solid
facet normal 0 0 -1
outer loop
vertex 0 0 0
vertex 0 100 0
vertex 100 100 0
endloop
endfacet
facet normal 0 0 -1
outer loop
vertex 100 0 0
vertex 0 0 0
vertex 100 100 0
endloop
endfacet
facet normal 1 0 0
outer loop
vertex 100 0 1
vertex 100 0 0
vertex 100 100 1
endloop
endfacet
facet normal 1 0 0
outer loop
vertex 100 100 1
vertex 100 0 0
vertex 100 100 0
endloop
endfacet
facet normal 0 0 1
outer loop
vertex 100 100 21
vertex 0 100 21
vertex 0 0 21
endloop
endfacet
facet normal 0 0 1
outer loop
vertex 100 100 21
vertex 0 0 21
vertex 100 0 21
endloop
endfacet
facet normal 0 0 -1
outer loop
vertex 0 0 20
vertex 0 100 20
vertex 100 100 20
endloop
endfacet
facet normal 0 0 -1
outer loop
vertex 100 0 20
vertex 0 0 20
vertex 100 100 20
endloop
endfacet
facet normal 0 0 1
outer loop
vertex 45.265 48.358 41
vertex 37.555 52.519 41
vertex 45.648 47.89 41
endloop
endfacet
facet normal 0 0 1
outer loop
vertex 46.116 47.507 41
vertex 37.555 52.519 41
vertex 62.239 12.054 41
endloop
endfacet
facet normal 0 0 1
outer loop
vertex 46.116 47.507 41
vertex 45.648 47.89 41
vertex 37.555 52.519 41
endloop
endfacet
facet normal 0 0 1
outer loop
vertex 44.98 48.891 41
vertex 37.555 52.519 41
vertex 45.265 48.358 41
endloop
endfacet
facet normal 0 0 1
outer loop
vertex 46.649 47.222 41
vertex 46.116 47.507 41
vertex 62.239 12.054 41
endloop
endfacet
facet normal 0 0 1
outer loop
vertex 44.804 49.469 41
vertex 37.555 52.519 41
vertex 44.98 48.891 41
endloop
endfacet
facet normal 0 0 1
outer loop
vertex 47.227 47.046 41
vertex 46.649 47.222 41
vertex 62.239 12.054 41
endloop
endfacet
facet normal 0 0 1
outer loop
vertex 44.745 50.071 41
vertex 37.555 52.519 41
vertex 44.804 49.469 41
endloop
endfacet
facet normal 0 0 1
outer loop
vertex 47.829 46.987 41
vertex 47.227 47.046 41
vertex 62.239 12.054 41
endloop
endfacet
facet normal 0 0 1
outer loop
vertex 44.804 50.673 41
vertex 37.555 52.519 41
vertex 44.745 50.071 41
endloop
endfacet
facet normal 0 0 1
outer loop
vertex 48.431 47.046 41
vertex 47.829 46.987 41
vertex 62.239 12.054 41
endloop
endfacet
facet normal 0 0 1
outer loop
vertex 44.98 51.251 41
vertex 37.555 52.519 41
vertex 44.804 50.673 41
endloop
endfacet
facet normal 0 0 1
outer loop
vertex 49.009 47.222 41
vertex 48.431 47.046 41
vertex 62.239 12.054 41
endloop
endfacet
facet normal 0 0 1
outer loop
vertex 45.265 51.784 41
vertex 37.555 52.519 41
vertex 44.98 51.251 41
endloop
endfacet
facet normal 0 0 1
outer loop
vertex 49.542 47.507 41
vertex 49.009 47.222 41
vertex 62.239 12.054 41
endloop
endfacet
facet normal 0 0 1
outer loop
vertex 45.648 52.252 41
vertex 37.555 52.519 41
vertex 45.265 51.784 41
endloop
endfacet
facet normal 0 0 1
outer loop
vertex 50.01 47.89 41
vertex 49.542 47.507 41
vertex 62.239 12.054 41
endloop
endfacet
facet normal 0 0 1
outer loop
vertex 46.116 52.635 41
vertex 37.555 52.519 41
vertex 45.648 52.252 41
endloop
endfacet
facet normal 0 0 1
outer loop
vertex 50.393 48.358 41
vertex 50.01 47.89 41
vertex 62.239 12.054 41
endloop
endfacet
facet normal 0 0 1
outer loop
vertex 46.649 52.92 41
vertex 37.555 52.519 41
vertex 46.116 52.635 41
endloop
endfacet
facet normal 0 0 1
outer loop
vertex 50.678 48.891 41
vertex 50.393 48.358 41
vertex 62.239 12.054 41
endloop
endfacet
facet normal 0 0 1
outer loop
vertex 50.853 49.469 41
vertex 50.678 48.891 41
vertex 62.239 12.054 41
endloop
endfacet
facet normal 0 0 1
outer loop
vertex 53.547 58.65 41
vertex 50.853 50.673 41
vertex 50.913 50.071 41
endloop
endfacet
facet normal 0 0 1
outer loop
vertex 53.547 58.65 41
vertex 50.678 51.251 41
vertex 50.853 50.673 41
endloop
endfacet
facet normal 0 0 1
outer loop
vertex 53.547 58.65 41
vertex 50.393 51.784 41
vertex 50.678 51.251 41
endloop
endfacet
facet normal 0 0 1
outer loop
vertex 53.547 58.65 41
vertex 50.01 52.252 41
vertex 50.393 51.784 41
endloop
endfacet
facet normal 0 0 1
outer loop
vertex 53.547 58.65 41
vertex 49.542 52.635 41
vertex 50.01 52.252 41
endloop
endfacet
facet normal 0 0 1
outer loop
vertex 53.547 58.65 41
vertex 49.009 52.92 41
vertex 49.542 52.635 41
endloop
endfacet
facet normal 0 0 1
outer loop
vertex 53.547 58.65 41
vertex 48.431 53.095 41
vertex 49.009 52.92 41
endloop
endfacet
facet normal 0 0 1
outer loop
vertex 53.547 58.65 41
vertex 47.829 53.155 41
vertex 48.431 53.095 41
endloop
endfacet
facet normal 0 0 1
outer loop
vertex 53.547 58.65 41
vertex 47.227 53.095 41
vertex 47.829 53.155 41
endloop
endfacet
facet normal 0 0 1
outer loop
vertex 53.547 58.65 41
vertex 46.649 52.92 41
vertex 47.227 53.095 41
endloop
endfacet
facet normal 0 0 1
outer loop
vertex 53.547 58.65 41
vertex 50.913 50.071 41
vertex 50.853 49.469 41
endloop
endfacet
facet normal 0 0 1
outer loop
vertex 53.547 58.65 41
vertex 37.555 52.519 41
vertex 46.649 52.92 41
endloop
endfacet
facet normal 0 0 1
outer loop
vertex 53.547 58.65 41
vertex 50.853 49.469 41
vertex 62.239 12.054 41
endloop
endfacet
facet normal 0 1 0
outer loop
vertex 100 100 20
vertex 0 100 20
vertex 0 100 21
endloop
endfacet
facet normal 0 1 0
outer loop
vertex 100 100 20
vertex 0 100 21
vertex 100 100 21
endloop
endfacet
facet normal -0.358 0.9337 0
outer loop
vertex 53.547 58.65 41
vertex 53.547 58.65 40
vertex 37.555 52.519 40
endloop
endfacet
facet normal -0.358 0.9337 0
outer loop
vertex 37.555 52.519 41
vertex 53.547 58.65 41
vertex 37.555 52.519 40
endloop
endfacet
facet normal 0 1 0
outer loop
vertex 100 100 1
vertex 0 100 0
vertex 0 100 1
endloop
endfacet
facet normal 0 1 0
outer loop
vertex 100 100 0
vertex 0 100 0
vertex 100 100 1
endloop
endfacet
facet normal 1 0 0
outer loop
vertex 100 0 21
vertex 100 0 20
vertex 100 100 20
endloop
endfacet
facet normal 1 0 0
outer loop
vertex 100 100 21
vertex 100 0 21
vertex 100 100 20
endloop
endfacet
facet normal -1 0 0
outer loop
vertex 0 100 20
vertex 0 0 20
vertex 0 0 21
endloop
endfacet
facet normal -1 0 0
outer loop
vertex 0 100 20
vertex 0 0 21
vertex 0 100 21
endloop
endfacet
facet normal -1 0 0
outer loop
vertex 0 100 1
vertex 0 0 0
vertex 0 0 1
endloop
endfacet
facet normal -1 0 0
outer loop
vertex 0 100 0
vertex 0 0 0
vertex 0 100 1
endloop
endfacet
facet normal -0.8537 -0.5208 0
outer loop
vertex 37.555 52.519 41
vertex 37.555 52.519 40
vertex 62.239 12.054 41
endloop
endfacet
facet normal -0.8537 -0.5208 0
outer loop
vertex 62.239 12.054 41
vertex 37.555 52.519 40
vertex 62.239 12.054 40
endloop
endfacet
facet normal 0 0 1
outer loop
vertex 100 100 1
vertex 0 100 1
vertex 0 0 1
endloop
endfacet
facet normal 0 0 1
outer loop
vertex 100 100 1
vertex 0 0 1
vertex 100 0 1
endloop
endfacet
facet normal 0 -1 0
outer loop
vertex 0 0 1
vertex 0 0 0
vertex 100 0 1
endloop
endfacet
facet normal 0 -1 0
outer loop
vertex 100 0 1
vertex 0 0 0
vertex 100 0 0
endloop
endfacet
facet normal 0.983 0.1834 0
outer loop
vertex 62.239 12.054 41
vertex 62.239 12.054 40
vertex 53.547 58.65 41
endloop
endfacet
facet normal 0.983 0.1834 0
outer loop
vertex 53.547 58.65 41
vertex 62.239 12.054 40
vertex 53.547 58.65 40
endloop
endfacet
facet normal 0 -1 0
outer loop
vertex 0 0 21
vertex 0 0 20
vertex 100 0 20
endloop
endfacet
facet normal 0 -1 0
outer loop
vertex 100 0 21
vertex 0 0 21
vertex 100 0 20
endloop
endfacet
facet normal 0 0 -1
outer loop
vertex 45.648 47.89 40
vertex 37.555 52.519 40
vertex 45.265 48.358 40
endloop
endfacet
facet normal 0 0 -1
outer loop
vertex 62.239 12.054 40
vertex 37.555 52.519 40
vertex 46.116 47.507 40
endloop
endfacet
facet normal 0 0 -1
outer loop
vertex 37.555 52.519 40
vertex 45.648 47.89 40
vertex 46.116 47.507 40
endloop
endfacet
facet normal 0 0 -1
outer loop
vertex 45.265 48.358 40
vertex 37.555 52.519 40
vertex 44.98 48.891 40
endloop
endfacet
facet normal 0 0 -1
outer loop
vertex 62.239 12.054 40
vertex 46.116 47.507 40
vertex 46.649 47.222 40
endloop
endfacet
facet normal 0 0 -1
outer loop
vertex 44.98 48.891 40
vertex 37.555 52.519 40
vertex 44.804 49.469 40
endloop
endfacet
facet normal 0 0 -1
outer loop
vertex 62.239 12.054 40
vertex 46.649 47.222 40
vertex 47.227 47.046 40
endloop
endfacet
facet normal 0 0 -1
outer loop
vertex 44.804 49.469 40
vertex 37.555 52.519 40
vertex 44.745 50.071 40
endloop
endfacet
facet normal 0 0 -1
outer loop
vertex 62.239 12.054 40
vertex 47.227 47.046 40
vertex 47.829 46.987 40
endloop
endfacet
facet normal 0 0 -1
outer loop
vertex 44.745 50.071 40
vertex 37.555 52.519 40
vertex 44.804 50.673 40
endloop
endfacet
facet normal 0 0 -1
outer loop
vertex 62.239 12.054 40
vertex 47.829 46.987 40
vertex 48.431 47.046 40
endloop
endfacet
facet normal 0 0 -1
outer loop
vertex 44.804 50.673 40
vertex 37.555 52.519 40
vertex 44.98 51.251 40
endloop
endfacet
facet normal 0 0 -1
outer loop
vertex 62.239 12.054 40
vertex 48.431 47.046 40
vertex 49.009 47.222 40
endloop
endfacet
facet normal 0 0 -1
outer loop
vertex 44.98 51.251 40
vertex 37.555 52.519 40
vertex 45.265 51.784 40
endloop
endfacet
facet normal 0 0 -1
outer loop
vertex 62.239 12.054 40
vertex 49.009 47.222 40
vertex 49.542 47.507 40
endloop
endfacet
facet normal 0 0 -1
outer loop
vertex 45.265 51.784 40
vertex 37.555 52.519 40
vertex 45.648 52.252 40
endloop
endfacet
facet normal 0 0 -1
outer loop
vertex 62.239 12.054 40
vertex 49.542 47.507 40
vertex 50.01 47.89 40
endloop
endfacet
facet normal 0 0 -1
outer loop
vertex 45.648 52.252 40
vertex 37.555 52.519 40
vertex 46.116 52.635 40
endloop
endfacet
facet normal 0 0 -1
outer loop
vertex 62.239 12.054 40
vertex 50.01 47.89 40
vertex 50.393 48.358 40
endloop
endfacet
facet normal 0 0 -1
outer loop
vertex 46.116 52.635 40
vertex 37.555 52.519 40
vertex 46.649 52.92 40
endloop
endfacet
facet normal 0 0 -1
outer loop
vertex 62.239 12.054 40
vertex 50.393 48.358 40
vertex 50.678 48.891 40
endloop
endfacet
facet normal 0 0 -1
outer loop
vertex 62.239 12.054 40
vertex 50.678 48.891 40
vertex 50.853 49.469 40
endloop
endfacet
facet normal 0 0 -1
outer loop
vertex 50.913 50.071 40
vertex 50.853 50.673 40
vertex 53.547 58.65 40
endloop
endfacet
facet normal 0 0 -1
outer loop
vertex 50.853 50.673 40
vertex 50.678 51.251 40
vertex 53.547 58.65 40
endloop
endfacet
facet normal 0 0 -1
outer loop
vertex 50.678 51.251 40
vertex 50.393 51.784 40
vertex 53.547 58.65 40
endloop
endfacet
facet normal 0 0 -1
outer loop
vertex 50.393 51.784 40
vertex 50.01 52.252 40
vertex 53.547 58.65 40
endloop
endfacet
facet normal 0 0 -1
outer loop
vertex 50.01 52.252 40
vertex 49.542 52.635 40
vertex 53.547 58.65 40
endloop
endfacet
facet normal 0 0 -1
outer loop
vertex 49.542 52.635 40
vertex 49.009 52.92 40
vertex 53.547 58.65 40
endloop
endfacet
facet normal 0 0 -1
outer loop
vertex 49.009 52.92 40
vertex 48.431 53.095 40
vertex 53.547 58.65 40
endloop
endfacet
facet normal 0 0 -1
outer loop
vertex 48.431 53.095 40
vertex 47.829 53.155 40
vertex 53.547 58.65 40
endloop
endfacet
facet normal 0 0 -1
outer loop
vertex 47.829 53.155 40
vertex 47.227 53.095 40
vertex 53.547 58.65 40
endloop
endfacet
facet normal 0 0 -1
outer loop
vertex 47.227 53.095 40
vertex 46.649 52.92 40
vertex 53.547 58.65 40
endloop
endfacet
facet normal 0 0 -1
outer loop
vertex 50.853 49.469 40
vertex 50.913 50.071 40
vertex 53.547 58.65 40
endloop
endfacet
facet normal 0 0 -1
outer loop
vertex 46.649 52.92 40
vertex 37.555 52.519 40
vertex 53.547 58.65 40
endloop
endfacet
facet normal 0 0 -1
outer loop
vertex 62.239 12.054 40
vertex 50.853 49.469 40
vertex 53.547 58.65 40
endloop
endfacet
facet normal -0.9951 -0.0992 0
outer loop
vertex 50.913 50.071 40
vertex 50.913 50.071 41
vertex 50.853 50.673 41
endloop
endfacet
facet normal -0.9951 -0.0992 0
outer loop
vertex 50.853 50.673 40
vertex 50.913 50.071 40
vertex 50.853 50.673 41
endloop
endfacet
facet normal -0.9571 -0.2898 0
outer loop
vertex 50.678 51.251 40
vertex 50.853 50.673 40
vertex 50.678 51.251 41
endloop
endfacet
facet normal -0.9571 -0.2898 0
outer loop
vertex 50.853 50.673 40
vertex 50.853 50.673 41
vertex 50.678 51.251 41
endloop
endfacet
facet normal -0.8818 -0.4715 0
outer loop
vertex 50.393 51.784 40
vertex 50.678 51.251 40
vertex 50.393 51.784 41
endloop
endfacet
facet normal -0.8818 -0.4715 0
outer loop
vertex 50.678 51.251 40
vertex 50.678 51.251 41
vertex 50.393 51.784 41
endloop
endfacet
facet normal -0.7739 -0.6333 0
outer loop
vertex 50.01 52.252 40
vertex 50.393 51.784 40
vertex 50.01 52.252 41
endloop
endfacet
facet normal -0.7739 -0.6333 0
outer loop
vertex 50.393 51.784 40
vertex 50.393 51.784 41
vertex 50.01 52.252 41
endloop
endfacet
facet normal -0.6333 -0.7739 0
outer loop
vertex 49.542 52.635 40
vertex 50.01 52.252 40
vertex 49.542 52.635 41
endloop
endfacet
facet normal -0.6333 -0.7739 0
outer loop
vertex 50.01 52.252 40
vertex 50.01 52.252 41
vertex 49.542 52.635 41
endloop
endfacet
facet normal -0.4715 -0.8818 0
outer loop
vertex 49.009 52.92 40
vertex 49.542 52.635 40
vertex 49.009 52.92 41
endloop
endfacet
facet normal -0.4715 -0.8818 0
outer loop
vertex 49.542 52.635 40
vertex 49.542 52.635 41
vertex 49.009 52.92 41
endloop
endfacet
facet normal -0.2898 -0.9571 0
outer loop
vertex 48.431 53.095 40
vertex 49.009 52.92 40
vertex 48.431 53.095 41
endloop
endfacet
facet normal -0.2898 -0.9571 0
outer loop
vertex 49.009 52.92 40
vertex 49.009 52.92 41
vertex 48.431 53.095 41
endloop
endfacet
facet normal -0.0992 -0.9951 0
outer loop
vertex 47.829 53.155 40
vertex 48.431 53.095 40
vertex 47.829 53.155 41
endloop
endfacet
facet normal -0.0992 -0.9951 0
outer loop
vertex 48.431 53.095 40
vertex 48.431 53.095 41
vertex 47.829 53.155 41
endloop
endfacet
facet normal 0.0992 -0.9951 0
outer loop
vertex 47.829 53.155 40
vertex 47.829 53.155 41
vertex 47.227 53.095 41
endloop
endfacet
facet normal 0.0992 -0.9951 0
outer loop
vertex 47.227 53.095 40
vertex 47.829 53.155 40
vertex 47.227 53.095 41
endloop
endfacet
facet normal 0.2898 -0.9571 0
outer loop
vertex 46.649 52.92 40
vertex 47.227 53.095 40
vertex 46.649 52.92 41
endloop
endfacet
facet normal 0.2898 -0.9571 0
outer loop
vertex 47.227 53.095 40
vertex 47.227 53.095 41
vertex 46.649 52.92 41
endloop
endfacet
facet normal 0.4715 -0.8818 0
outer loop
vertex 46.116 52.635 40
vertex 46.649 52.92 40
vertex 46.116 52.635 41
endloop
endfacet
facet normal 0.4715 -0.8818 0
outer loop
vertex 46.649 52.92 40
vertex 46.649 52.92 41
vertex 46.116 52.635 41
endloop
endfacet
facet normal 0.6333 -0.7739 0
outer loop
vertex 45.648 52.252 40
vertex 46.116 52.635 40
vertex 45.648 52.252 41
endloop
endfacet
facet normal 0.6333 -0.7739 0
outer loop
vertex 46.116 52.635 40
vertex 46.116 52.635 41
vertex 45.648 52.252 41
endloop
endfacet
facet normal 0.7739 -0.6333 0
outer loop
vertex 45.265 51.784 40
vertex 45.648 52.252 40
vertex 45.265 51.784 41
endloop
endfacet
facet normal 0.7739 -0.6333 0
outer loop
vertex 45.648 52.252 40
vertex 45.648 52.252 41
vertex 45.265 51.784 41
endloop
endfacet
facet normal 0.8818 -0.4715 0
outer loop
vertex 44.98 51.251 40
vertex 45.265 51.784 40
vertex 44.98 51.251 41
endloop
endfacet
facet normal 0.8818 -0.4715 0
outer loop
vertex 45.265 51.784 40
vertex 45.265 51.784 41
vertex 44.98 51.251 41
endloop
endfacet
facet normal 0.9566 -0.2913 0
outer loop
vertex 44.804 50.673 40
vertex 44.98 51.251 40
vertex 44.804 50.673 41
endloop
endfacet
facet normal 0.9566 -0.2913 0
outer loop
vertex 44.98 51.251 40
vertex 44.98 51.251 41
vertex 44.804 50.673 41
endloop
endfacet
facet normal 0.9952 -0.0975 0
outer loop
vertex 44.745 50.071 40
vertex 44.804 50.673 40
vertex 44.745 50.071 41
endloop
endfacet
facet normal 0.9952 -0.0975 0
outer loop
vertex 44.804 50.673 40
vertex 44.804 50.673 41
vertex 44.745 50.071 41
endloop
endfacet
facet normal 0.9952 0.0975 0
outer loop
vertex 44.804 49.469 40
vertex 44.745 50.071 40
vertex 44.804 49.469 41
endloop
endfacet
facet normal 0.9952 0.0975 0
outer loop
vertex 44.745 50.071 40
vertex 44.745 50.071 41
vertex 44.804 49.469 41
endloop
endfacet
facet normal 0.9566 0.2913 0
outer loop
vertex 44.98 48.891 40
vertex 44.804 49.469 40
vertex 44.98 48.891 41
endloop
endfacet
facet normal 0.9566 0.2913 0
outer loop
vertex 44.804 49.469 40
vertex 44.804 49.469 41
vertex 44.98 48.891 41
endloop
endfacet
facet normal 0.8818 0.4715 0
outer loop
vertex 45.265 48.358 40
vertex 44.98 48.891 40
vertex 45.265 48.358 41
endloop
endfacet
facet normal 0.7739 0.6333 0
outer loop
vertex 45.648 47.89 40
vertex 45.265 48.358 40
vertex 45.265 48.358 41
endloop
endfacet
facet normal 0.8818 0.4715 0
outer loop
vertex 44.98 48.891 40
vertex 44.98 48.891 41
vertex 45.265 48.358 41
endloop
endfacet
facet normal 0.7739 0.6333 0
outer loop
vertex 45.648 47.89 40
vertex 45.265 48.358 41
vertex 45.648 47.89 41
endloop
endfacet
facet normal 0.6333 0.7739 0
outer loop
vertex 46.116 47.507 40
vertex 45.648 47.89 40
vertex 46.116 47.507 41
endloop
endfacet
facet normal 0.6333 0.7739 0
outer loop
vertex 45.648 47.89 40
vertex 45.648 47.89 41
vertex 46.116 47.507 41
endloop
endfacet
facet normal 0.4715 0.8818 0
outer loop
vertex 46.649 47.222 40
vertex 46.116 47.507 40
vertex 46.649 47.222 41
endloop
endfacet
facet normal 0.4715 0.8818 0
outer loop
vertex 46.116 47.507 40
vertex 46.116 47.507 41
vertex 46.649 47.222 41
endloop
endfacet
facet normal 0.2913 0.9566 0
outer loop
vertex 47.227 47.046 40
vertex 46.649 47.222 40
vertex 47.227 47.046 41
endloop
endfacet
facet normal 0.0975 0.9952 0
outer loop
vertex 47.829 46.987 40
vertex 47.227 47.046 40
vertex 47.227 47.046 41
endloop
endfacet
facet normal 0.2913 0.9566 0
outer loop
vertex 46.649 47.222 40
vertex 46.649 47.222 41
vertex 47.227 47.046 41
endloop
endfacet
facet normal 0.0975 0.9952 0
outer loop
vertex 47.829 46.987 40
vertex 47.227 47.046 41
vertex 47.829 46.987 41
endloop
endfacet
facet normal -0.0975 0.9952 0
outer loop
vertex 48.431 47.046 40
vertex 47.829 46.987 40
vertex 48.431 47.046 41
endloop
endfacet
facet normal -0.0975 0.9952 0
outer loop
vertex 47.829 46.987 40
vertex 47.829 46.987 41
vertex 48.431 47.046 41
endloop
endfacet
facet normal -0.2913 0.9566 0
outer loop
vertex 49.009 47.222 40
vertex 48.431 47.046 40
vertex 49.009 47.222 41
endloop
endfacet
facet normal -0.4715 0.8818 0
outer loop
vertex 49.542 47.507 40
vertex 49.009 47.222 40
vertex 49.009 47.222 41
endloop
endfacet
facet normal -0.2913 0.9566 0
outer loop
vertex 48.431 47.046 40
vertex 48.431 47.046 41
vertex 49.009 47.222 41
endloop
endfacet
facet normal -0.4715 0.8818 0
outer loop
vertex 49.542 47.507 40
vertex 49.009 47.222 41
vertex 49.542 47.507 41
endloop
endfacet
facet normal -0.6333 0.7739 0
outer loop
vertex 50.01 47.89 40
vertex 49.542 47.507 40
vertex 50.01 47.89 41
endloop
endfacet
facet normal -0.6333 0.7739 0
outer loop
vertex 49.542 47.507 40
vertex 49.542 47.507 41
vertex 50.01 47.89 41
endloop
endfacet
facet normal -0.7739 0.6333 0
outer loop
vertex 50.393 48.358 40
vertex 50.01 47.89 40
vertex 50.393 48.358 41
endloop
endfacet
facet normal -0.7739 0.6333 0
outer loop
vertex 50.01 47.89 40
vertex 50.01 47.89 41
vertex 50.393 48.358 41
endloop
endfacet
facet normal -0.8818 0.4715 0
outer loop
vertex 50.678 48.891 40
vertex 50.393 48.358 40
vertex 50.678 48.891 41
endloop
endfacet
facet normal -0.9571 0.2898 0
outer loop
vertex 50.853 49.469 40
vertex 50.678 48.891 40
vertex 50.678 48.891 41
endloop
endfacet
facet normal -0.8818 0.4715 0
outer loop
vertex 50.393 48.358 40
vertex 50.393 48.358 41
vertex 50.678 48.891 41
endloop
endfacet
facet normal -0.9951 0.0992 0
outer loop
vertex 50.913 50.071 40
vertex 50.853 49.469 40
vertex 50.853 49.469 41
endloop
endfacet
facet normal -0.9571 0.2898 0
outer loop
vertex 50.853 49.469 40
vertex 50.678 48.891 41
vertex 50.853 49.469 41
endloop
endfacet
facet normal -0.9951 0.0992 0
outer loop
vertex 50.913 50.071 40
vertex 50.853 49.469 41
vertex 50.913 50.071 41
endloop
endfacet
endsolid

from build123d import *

# Parameters (mm, degrees)
BOX_W           = 100
BOX_H           = 100
BOX_DEPTH       = 1
BOX001_W        = 100
BOX001_H        = 100
BOX001_DEPTH    = 1
PAD_DEPTH       = 1
SKETCH004_R     = 3.0838
POCKET003_DEPTH = 1


with BuildPart() as cube:
    # Box → Box (new body)
    with BuildSketch(Plane.XY):
        with Locations((50, 50)):
            Rectangle(BOX_W, BOX_H)
    extrude(amount=BOX_DEPTH)


with BuildPart() as cube001:
    # Box001 → Box001 (new body)
    with BuildSketch(Plane.XY.offset(20)):
        with Locations((50, 50)):
            Rectangle(BOX001_W, BOX001_H)
    extrude(amount=BOX001_DEPTH)


with BuildPart() as pocket003:
    # Sketch003 → Pad (new body)
    with BuildSketch(Plane.XY.offset(40)):
        Polygon((62.239094, 12.053726), (53.547153, 58.650245), (37.554805, 52.519406), align=None)
    extrude(amount=PAD_DEPTH)

    # Sketch004 → Pocket003 (cut)
    with BuildSketch(Plane.XY.offset(41)):
        with Locations((47.828934, 50.07093)):
            Circle(SKETCH004_R)
    extrude(amount=-POCKET003_DEPTH, mode=Mode.SUBTRACT)


solid = Compound([cube.part, cube001.part, pocket003.part])
